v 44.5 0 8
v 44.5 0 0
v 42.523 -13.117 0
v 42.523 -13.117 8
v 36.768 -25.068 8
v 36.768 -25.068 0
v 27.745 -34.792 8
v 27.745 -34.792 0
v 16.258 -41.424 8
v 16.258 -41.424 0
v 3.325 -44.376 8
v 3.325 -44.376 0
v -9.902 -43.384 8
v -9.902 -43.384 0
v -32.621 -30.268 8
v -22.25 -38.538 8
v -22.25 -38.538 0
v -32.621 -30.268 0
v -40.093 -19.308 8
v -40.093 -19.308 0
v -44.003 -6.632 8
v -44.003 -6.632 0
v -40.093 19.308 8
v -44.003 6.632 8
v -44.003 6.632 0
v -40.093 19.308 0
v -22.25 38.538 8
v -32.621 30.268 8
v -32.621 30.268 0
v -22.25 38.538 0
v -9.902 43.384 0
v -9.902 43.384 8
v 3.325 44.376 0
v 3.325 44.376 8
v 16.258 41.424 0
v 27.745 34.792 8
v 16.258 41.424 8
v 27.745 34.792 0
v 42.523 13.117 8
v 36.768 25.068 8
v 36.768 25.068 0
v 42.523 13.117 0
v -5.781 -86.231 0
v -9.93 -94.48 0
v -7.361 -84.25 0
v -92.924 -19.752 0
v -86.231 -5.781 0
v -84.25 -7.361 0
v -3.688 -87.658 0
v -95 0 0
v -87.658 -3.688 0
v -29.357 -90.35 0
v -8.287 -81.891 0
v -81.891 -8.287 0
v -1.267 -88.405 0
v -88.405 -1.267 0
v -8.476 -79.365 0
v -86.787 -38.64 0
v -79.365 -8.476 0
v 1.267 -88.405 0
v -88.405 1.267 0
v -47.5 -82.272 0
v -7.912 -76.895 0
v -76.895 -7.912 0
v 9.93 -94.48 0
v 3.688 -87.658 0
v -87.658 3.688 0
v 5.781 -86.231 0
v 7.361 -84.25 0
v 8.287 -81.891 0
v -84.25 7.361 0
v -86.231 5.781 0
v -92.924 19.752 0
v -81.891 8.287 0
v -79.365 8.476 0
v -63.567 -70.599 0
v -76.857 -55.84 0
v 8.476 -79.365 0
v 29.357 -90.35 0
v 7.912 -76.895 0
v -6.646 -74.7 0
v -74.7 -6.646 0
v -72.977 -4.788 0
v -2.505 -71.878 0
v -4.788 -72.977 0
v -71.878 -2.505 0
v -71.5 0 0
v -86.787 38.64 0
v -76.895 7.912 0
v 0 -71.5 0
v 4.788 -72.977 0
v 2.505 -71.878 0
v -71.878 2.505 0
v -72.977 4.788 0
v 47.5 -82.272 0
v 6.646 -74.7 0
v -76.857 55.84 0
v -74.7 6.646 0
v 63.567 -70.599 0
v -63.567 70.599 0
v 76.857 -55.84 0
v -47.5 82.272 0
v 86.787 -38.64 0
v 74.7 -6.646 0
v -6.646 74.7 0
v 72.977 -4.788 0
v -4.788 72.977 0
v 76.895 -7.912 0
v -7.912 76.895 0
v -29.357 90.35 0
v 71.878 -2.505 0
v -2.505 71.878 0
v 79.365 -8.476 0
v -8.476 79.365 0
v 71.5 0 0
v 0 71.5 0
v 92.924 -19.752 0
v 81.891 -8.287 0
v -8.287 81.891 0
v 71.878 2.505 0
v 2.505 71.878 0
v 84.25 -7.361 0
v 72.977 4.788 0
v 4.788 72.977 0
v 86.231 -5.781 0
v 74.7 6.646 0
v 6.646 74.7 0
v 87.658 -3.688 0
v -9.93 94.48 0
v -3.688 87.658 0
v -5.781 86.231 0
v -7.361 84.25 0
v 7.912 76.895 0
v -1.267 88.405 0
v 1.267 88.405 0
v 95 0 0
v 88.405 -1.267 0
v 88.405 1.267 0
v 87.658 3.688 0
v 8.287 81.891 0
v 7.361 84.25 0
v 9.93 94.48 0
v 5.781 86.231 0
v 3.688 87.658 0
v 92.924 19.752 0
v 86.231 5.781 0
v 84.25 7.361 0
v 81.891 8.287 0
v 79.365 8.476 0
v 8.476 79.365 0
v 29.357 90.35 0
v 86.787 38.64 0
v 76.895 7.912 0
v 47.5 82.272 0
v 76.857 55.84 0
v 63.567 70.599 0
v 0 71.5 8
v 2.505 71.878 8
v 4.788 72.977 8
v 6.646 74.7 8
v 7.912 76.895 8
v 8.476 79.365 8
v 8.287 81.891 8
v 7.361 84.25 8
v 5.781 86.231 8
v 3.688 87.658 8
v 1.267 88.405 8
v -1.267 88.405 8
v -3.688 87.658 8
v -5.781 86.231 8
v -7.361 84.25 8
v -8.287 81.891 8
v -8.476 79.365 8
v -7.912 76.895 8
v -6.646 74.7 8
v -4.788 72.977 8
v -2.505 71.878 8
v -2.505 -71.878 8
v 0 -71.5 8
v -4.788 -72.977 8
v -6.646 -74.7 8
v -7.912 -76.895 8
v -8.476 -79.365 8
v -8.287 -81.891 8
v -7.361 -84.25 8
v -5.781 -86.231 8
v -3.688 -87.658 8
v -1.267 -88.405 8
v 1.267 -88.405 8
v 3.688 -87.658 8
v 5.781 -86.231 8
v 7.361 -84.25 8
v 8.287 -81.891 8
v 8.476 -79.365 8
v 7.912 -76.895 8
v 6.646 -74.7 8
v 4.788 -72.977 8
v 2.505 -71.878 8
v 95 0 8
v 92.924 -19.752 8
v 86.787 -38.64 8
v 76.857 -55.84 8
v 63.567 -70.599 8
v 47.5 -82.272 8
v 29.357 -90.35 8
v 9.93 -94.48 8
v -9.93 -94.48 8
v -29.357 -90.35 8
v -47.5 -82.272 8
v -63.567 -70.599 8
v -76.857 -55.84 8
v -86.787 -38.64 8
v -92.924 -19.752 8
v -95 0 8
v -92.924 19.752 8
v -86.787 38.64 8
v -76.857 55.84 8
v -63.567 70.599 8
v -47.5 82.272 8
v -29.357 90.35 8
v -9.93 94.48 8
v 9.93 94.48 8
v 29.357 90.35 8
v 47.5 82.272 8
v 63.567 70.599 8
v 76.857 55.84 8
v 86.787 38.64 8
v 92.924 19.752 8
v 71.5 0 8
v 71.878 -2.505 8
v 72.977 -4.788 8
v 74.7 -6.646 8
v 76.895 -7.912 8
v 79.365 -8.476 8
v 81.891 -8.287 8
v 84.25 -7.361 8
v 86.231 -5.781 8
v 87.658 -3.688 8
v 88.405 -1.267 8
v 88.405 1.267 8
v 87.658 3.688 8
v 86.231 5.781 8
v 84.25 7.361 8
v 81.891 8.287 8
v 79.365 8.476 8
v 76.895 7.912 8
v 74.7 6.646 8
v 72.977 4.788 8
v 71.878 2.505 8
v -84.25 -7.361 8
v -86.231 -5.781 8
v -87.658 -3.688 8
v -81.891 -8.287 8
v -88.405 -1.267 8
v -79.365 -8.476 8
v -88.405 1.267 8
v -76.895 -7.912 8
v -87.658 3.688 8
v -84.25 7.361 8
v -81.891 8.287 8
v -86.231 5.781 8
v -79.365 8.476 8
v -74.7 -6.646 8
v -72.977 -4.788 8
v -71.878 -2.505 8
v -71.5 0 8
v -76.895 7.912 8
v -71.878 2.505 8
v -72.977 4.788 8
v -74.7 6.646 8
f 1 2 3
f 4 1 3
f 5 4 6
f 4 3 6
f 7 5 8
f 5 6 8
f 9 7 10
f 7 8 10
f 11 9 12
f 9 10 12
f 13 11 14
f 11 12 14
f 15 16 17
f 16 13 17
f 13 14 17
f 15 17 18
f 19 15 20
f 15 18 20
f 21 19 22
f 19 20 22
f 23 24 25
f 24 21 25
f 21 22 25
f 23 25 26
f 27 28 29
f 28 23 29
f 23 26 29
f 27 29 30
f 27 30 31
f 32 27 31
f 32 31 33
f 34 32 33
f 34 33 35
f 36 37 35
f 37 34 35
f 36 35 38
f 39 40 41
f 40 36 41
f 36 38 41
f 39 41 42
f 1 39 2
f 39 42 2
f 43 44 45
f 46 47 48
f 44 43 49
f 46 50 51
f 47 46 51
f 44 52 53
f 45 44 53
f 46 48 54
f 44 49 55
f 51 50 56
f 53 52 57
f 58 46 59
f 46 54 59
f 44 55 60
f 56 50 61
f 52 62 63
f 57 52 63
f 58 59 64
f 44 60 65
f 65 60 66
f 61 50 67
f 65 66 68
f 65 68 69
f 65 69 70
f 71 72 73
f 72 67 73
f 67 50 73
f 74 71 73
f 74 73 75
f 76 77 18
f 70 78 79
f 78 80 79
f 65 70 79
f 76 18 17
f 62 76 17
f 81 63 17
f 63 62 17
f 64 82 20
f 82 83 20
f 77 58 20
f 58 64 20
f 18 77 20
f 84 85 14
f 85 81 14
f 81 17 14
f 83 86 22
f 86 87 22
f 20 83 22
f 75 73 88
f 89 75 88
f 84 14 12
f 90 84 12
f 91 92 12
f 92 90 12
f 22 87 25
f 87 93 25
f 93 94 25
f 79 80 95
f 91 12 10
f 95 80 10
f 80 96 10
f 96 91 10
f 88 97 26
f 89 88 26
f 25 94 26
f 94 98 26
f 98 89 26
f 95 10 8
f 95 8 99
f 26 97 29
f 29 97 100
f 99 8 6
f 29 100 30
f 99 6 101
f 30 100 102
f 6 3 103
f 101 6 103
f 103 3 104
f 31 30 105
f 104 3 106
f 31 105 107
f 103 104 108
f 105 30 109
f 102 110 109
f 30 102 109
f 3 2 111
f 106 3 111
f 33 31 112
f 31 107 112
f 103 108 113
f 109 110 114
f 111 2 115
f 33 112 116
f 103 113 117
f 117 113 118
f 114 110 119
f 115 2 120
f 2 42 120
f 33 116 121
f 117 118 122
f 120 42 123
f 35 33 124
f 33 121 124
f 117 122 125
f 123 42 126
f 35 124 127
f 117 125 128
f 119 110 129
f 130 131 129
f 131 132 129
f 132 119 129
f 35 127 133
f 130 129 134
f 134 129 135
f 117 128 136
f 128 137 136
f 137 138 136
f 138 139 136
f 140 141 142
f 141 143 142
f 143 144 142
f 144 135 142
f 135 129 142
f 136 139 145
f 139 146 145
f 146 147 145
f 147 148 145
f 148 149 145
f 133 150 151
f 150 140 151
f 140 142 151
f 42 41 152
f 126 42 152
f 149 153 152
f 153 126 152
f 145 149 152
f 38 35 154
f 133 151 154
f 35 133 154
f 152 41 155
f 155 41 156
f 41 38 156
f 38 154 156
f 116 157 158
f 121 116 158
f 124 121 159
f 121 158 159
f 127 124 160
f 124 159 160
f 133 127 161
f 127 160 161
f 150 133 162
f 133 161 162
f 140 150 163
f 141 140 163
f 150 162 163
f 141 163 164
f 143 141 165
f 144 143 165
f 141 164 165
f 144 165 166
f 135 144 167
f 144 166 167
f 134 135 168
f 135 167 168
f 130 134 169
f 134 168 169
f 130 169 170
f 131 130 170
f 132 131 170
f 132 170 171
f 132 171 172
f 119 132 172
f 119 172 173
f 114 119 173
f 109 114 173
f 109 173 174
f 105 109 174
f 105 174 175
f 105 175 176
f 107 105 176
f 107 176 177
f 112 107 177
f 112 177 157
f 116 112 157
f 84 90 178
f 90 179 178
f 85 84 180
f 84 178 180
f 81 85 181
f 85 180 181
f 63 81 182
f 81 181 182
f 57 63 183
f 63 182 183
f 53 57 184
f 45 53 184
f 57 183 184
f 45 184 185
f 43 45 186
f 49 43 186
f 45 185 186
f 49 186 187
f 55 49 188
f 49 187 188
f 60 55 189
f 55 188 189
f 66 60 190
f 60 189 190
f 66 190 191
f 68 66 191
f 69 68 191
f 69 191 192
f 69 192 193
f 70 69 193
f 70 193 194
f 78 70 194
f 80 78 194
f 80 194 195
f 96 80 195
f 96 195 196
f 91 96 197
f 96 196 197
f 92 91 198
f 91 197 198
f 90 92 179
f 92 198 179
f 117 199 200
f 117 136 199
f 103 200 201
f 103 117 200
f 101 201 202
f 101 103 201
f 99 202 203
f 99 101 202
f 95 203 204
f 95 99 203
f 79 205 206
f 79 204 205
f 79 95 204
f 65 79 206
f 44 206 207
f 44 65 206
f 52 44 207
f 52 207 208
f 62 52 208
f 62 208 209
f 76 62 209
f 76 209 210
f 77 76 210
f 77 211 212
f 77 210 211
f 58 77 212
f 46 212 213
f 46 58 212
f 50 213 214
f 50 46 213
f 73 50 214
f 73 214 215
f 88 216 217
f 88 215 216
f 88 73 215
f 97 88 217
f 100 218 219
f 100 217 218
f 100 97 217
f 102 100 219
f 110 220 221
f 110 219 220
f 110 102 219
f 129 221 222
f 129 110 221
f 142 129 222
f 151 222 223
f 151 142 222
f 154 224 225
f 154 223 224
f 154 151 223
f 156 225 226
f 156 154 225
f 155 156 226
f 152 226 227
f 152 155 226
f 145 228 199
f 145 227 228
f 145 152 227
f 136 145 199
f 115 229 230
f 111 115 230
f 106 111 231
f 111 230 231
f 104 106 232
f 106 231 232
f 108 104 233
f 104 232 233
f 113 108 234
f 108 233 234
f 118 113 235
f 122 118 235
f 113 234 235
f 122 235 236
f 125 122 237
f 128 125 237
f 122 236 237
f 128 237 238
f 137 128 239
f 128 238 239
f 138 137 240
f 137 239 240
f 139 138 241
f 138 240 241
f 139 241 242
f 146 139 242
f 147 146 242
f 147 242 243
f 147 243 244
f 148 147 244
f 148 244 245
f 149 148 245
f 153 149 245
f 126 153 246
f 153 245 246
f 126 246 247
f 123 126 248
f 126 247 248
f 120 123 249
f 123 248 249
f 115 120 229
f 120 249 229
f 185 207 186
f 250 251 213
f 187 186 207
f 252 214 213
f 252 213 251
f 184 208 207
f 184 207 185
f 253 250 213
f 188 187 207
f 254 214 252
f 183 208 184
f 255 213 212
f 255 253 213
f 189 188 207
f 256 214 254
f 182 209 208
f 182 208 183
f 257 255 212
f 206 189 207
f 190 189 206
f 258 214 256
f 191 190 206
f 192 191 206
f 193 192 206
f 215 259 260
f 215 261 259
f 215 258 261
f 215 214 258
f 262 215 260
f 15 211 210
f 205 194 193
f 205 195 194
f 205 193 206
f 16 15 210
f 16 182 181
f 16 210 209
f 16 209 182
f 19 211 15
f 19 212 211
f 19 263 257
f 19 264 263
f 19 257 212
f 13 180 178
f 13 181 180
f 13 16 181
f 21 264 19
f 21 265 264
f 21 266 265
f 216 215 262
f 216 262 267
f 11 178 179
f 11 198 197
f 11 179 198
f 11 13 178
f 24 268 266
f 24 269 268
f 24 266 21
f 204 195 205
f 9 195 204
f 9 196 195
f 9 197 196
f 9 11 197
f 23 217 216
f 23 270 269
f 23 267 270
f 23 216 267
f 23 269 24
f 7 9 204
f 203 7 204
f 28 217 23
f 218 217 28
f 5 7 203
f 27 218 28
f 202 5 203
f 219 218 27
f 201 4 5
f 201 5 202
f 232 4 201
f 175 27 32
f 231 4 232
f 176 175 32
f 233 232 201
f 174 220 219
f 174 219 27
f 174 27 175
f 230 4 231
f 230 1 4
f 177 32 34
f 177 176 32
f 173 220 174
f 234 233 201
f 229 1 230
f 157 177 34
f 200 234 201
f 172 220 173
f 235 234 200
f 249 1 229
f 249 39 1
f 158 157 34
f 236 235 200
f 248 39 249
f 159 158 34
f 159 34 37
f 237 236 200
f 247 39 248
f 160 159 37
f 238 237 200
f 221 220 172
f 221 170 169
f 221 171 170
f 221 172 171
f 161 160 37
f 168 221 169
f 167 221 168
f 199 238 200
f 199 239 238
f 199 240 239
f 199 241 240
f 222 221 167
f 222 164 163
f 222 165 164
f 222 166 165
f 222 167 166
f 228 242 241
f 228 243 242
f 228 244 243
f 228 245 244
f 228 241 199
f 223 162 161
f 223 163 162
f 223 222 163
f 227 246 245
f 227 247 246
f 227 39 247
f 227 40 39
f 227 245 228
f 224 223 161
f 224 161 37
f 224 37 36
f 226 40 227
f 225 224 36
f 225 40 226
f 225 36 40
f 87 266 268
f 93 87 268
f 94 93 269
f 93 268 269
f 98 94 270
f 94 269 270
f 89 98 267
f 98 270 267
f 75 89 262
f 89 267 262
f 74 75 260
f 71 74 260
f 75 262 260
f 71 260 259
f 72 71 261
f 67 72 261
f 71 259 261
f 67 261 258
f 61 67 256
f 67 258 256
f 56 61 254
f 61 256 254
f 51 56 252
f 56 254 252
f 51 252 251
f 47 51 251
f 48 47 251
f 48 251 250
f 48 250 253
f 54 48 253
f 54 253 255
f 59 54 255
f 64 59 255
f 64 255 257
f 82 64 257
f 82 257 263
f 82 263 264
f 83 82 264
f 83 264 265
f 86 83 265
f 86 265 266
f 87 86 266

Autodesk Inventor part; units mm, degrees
ref_plane "YZ Plane" through (0, 0, 0) normal (1, 0, 0) x (0, 1, 0)
ref_plane "XZ Plane" through (0, 0, 0) normal (0, 1, 0) x (-1, 0, 0)
ref_plane "XY Plane" through (0, 0, 0) normal (0, 0, 1) x (1, 0, 0)
sketch "Sketch2" plane through (0, 0, 0) normal (0, 0, 1) x (1, 0, 0)
  circle A0 centre (0, 0) radius 44.5
  circle A1 centre (0, 0) radius 95
  dimension "d25" = 89
  dimension "d27" = 190
extrude "Plate2" add sketch "Sketch2" along normal blind 8
sketch "Sketch3" plane through (0, 0, 8) normal (0, 0, 1) x (1, 0, 0)
  circle A0 centre (-80, 0) radius 8.5
  circle A1 centre (0, 0) radius 80 construction
  dimension "d28" = 160
  dimension "d15" = 17
extrude "Cut1" cut sketch "Sketch3" against normal blind 8
pattern_circular "Circular Pattern1" count 4 over 360 about axis through (0, 0, -10) along (0, 0, 1) of "Cut1"
equation "\"d17\" = Thickness"
equation "\"d14\" = Thickness"
equation "\"BendReliefWidth\" = Thickness"
equation "\"BendReliefDepth\" = 0.5 * Thickness"
equation "\"CornerReliefSize\" = 4 * Thickness"
equation "\"MinimumRemnant\" = 2 * Thickness"
equation "\"TransitionRadius\" = BendRadius"
equation "\"JacobiRadiusSize\" = BendRadius"
equation "\"GapSize\" = Thickness"
equation "\"Thickness\" = 8"
equation "\"BendRadius\" = 6"
properties part number "TZS 0931 FDS flange DN90" material "Steel"
